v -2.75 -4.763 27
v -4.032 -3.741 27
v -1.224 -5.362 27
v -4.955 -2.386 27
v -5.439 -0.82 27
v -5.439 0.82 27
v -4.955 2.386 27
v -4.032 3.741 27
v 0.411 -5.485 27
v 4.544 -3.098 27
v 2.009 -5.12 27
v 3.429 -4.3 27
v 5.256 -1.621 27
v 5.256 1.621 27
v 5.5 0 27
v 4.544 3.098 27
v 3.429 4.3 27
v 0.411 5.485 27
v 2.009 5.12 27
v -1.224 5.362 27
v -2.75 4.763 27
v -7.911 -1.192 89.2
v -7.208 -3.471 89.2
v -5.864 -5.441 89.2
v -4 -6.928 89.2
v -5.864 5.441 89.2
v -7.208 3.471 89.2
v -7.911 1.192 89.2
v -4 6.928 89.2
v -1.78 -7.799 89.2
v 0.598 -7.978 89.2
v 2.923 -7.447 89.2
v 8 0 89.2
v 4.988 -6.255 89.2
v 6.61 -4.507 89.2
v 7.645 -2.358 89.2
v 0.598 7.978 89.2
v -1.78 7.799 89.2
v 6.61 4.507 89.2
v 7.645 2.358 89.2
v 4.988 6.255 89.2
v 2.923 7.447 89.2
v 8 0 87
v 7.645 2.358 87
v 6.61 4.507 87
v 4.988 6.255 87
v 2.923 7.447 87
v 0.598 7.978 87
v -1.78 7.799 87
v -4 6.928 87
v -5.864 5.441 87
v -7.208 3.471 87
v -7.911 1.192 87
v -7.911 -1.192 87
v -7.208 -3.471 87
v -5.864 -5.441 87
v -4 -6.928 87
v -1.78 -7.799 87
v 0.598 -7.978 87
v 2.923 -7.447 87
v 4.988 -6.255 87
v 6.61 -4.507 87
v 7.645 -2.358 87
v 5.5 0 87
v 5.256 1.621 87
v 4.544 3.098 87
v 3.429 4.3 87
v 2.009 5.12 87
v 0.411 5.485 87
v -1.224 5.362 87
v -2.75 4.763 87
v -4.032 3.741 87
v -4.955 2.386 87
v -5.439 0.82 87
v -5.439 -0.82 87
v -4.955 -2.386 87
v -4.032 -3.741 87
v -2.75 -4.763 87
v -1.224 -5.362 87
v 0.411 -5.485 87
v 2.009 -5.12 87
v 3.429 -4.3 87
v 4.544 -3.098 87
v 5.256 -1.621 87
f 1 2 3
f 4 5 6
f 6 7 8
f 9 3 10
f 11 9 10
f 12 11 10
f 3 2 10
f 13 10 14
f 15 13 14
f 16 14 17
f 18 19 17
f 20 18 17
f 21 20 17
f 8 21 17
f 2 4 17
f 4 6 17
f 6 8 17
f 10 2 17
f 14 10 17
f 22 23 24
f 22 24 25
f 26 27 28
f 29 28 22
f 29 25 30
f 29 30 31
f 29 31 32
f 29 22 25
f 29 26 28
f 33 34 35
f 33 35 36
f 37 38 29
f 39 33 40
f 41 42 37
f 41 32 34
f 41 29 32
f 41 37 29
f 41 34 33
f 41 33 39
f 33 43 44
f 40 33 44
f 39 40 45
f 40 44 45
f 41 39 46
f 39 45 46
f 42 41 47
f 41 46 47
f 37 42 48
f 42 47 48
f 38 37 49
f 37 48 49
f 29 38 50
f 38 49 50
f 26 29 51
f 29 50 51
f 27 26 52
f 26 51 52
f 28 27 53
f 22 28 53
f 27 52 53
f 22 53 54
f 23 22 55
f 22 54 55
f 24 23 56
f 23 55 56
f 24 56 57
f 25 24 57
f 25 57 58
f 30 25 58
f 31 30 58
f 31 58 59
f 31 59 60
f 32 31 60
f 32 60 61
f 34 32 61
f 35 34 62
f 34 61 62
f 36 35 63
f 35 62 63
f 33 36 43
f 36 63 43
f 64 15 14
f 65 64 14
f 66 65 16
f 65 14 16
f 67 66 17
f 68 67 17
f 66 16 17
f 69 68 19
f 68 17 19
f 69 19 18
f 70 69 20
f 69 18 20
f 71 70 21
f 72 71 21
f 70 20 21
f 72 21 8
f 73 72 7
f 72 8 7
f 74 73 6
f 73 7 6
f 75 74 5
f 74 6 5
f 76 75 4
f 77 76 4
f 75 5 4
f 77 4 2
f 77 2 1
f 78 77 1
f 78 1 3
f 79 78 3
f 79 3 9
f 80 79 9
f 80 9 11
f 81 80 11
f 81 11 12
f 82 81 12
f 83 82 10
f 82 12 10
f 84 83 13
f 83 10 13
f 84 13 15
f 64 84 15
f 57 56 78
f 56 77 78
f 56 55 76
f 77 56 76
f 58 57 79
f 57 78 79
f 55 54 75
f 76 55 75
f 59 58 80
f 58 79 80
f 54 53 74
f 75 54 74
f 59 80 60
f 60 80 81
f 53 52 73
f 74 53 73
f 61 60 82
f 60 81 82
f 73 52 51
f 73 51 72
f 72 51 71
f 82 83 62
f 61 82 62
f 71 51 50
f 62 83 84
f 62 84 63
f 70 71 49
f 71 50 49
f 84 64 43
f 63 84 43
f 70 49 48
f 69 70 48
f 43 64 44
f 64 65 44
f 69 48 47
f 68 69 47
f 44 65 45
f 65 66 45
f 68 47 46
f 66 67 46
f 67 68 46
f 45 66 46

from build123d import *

# Parameters (mm, degrees)
CYLINDER110_R     = 5.5
CYLINDER110_DEPTH = 60
CYLINDER109_R     = 8
CYLINDER109_DEPTH = 2.2


with BuildPart() as syringe_pusher_body:
    # Cylinder110 → Cylinder110 (new body)
    with BuildSketch(Plane.XY):
        Circle(CYLINDER110_R)
    extrude(amount=CYLINDER110_DEPTH)


with BuildPart() as syringe_pusher:
    # Cylinder109 → Cylinder109 (new body)
    with BuildSketch(Plane.XY.offset(60)):
        Circle(CYLINDER109_R)
    extrude(amount=CYLINDER109_DEPTH)

    # Fusion012: union syringe pusher body
    add(syringe_pusher_body.part)


with BuildPart() as syringe_pusher_1:
    # Fusion012 placement: moved
    add(syringe_pusher.part.moved(Location((0, 0, 27))))


solid = syringe_pusher_1.part
